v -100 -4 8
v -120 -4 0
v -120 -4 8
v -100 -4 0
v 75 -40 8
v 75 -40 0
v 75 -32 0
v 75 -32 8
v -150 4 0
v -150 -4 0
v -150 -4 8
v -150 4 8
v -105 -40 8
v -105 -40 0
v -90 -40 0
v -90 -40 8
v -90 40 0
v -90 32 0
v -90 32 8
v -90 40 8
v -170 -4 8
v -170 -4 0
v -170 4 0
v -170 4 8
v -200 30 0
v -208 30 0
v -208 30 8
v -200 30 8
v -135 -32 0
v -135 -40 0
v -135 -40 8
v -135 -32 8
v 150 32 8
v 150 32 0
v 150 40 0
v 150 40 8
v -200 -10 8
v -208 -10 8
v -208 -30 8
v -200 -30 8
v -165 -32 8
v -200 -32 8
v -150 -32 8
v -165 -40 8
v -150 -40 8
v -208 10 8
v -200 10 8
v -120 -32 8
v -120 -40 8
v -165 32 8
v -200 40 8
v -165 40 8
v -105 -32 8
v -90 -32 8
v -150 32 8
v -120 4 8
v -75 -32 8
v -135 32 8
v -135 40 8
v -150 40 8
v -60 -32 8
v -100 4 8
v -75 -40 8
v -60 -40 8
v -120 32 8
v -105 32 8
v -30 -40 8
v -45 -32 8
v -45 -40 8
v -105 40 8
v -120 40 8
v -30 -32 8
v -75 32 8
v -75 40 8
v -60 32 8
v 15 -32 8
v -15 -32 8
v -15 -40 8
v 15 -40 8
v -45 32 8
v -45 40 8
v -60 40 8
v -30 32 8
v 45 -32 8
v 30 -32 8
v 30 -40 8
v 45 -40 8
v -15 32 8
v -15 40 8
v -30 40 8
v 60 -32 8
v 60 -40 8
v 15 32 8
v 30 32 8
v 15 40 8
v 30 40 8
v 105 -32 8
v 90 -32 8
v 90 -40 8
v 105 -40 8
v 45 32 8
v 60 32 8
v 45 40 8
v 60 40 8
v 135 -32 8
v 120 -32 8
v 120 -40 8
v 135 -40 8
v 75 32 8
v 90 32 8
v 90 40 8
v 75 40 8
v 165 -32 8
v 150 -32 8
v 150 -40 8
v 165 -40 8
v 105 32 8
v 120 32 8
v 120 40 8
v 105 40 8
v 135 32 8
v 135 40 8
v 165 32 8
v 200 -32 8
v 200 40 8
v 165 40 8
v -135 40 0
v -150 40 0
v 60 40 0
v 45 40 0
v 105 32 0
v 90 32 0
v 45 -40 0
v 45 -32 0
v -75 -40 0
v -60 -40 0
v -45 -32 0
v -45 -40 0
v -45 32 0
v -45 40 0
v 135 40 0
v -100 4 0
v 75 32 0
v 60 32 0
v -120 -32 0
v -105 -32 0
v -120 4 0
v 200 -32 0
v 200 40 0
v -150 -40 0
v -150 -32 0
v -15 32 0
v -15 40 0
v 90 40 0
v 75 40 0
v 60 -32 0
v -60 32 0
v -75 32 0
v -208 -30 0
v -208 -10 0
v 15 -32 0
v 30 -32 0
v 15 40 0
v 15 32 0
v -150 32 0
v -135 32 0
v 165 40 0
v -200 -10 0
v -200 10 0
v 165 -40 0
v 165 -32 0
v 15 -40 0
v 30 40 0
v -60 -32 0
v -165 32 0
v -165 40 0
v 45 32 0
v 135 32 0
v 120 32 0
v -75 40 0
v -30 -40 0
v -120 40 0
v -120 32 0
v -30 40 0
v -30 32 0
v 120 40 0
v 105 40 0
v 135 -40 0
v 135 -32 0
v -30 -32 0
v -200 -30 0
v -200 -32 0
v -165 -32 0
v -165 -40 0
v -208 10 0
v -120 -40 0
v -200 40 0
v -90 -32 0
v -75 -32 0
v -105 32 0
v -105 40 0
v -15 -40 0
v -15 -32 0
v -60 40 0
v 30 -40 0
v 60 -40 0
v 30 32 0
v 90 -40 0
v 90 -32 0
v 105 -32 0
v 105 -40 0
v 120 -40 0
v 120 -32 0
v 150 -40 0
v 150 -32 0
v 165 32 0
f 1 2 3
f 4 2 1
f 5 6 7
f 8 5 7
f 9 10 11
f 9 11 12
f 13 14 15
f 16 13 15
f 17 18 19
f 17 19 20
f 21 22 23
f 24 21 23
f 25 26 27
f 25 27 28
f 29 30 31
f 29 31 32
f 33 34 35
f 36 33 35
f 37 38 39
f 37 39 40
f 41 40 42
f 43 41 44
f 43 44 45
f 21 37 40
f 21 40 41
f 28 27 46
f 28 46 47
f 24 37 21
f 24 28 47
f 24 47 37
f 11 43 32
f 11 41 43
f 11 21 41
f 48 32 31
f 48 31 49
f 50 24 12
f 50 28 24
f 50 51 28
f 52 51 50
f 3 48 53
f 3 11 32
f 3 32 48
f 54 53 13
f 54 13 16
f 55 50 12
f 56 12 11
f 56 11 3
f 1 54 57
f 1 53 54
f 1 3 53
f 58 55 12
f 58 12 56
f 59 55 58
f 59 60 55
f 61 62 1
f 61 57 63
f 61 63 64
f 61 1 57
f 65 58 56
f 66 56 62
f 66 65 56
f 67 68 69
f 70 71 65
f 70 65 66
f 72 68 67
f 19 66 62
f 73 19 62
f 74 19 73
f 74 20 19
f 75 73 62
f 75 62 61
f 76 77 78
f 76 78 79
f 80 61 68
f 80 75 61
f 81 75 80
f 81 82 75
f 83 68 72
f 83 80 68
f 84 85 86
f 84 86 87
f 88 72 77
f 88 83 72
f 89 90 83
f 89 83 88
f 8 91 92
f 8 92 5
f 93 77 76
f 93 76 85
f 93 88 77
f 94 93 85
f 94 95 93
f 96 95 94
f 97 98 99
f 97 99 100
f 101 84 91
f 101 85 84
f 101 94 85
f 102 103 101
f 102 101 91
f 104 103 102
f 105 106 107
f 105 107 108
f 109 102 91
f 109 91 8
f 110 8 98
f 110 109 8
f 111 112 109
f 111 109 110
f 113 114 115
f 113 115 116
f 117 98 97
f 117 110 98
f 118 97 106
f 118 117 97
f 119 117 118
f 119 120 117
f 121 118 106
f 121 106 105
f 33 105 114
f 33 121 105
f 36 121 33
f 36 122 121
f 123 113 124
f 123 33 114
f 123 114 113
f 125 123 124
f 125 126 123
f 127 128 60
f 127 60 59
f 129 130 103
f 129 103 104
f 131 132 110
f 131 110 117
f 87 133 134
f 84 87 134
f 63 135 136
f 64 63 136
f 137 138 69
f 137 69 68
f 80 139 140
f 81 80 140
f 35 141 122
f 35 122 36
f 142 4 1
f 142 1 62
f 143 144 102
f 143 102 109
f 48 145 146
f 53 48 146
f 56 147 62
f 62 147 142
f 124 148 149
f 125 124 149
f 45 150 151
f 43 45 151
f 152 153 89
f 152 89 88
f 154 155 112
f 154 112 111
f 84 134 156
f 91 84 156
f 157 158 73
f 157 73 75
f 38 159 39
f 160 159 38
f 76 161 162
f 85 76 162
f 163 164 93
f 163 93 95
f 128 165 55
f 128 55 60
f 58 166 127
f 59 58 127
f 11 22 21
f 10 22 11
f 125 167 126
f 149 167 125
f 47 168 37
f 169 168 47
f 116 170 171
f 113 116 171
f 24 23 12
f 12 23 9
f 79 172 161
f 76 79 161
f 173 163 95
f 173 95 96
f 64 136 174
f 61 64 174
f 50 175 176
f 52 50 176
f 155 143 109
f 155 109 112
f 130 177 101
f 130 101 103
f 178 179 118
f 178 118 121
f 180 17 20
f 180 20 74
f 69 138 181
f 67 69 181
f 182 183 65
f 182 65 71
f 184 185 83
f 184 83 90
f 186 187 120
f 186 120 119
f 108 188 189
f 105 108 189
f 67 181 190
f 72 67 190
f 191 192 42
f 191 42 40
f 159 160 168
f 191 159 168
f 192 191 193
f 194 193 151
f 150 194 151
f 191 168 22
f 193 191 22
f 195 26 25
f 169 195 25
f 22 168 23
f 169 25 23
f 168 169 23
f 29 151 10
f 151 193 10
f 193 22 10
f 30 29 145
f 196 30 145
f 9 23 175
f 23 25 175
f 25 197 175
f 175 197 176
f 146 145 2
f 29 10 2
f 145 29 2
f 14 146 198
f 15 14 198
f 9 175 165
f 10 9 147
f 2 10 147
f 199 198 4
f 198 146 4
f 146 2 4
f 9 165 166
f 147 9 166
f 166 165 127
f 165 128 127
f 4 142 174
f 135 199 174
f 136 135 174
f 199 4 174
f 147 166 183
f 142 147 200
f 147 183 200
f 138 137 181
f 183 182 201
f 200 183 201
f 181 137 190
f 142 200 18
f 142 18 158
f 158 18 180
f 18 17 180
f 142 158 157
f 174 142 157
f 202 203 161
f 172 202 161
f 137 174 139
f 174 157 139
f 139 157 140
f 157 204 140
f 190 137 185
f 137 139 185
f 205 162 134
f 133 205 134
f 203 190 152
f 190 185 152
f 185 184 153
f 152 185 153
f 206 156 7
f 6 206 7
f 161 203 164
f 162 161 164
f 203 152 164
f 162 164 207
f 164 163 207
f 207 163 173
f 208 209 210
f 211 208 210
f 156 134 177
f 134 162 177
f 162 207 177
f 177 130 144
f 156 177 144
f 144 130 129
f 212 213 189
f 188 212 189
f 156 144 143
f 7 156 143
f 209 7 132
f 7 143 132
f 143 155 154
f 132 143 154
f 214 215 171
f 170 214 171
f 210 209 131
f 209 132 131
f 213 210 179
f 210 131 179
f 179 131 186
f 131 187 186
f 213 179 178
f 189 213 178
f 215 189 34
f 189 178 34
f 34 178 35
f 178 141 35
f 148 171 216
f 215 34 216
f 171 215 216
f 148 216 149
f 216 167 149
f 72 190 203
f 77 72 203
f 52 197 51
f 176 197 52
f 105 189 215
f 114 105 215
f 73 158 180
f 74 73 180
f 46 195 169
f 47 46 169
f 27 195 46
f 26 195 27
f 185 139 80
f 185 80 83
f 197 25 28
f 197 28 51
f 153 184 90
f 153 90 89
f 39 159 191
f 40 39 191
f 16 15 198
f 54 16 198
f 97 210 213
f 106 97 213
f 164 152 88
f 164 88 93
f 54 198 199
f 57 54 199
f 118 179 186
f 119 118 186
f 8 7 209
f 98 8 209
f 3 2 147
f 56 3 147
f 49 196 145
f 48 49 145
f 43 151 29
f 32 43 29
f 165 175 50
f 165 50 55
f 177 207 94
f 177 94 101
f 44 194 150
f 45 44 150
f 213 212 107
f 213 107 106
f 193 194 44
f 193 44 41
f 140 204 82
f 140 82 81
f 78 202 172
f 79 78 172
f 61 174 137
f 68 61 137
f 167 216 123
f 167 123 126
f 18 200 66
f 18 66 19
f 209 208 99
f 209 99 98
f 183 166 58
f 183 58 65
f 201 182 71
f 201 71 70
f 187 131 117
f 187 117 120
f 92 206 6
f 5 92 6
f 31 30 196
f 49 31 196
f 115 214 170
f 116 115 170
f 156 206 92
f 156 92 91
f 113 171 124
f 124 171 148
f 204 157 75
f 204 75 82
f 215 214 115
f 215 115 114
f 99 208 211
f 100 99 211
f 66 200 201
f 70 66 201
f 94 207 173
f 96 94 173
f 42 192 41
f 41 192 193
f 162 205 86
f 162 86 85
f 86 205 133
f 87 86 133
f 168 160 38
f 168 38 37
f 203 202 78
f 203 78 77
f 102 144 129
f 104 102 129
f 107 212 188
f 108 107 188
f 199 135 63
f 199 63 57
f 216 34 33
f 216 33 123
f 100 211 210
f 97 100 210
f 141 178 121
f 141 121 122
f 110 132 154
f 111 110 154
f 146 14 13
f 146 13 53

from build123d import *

# Parameters (mm, degrees)
ESQUISSE1_W             = 400
ESQUISSE1_H             = 80
BOSS_EXTRU_1_DEPTH      = 8
ESQUISSE2_W             = 8
ESQUISSE2_H             = 20
BOSS_EXTRU_2_DEPTH      = 8
ESQUISSE4_W             = 15
ESQUISSE4_H             = 8
ENL_V_MAT_EXTRU_1_DEPTH = 212.962260792
ESQUISSE5_W             = 15
ESQUISSE5_H             = 8
ESQUISSE5_W_2           = 35
ENL_V_MAT_EXTRU_2_DEPTH = 212.962260792
ESQUISSE6_W             = 20
ESQUISSE6_H             = 8
ENL_V_MAT_EXTRU_3_DEPTH = 212.962260792


with BuildPart() as part:
    # Esquisse1 → Boss.-Extru.1 (new body)
    with BuildSketch(Plane.XY):
        Rectangle(ESQUISSE1_W, ESQUISSE1_H)
    extrude(amount=BOSS_EXTRU_1_DEPTH)

    # Esquisse2 → Boss.-Extru.2 (add)
    with BuildSketch(Plane.XY):
        with Locations((-204, 20)):
            Rectangle(ESQUISSE2_W, ESQUISSE2_H)
        with Locations((-204, -20)):
            Rectangle(ESQUISSE2_W, ESQUISSE2_H)
    extrude(amount=BOSS_EXTRU_2_DEPTH)

    # Esquisse4 → Enlèv. mat.-Extru.1 (cut, through all)
    with BuildSketch(Plane.XY):
        Polygon((0, 40), (-15, 40), (-15, 32), (0, 32), (15, 32), (15, 40), align=None)
        with Locations((-37.5, 36)):
            Rectangle(ESQUISSE4_W, ESQUISSE4_H)
        with Locations((-67.5, 36)):
            Rectangle(ESQUISSE4_W, ESQUISSE4_H)
        with Locations((-97.5, 36)):
            Rectangle(ESQUISSE4_W, ESQUISSE4_H)
        with Locations((-127.5, 36)):
            Rectangle(ESQUISSE4_W, ESQUISSE4_H)
        with Locations((-157.5, 36)):
            Rectangle(ESQUISSE4_W, ESQUISSE4_H)
        with Locations((37.5, 36)):
            Rectangle(ESQUISSE4_W, ESQUISSE4_H)
        with Locations((67.5, 36)):
            Rectangle(ESQUISSE4_W, ESQUISSE4_H)
        with Locations((97.5, 36)):
            Rectangle(ESQUISSE4_W, ESQUISSE4_H)
        with Locations((127.5, 36)):
            Rectangle(ESQUISSE4_W, ESQUISSE4_H)
        with Locations((157.5, 36)):
            Rectangle(ESQUISSE4_W, ESQUISSE4_H)
    extrude(amount=ENL_V_MAT_EXTRU_1_DEPTH, mode=Mode.SUBTRACT)

    # Esquisse5 → Enlèv. mat.-Extru.2 (cut, through all)
    with BuildSketch(Plane.XY):
        with Locations((-22.5, -36)):
            Rectangle(ESQUISSE5_W, ESQUISSE5_H)
        with Locations((-52.5, -36)):
            Rectangle(ESQUISSE5_W, ESQUISSE5_H)
        with Locations((-82.5, -36)):
            Rectangle(ESQUISSE5_W, ESQUISSE5_H)
        with Locations((-112.5, -36)):
            Rectangle(ESQUISSE5_W, ESQUISSE5_H)
        with Locations((-142.5, -36)):
            Rectangle(ESQUISSE5_W, ESQUISSE5_H)
        with Locations((-182.5, -36)):
            Rectangle(ESQUISSE5_W_2, ESQUISSE5_H)
        with Locations((22.5, -36)):
            Rectangle(ESQUISSE5_W, ESQUISSE5_H)
        with Locations((52.5, -36)):
            Rectangle(ESQUISSE5_W, ESQUISSE5_H)
        with Locations((82.5, -36)):
            Rectangle(ESQUISSE5_W, ESQUISSE5_H)
        with Locations((112.5, -36)):
            Rectangle(ESQUISSE5_W, ESQUISSE5_H)
        with Locations((142.5, -36)):
            Rectangle(ESQUISSE5_W, ESQUISSE5_H)
        with Locations((182.5, -36)):
            Rectangle(ESQUISSE5_W_2, ESQUISSE5_H)
    extrude(amount=ENL_V_MAT_EXTRU_2_DEPTH, mode=Mode.SUBTRACT)

    # Esquisse6 → Enlèv. mat.-Extru.3 (cut, through all)
    with BuildSketch(Plane.XY):
        with Locations((-160, 0)):
            Rectangle(ESQUISSE6_W, ESQUISSE6_H)
        with Locations((-110, 0)):
            Rectangle(ESQUISSE6_W, ESQUISSE6_H)
    extrude(amount=ENL_V_MAT_EXTRU_3_DEPTH, mode=Mode.SUBTRACT)


solid = part.part
